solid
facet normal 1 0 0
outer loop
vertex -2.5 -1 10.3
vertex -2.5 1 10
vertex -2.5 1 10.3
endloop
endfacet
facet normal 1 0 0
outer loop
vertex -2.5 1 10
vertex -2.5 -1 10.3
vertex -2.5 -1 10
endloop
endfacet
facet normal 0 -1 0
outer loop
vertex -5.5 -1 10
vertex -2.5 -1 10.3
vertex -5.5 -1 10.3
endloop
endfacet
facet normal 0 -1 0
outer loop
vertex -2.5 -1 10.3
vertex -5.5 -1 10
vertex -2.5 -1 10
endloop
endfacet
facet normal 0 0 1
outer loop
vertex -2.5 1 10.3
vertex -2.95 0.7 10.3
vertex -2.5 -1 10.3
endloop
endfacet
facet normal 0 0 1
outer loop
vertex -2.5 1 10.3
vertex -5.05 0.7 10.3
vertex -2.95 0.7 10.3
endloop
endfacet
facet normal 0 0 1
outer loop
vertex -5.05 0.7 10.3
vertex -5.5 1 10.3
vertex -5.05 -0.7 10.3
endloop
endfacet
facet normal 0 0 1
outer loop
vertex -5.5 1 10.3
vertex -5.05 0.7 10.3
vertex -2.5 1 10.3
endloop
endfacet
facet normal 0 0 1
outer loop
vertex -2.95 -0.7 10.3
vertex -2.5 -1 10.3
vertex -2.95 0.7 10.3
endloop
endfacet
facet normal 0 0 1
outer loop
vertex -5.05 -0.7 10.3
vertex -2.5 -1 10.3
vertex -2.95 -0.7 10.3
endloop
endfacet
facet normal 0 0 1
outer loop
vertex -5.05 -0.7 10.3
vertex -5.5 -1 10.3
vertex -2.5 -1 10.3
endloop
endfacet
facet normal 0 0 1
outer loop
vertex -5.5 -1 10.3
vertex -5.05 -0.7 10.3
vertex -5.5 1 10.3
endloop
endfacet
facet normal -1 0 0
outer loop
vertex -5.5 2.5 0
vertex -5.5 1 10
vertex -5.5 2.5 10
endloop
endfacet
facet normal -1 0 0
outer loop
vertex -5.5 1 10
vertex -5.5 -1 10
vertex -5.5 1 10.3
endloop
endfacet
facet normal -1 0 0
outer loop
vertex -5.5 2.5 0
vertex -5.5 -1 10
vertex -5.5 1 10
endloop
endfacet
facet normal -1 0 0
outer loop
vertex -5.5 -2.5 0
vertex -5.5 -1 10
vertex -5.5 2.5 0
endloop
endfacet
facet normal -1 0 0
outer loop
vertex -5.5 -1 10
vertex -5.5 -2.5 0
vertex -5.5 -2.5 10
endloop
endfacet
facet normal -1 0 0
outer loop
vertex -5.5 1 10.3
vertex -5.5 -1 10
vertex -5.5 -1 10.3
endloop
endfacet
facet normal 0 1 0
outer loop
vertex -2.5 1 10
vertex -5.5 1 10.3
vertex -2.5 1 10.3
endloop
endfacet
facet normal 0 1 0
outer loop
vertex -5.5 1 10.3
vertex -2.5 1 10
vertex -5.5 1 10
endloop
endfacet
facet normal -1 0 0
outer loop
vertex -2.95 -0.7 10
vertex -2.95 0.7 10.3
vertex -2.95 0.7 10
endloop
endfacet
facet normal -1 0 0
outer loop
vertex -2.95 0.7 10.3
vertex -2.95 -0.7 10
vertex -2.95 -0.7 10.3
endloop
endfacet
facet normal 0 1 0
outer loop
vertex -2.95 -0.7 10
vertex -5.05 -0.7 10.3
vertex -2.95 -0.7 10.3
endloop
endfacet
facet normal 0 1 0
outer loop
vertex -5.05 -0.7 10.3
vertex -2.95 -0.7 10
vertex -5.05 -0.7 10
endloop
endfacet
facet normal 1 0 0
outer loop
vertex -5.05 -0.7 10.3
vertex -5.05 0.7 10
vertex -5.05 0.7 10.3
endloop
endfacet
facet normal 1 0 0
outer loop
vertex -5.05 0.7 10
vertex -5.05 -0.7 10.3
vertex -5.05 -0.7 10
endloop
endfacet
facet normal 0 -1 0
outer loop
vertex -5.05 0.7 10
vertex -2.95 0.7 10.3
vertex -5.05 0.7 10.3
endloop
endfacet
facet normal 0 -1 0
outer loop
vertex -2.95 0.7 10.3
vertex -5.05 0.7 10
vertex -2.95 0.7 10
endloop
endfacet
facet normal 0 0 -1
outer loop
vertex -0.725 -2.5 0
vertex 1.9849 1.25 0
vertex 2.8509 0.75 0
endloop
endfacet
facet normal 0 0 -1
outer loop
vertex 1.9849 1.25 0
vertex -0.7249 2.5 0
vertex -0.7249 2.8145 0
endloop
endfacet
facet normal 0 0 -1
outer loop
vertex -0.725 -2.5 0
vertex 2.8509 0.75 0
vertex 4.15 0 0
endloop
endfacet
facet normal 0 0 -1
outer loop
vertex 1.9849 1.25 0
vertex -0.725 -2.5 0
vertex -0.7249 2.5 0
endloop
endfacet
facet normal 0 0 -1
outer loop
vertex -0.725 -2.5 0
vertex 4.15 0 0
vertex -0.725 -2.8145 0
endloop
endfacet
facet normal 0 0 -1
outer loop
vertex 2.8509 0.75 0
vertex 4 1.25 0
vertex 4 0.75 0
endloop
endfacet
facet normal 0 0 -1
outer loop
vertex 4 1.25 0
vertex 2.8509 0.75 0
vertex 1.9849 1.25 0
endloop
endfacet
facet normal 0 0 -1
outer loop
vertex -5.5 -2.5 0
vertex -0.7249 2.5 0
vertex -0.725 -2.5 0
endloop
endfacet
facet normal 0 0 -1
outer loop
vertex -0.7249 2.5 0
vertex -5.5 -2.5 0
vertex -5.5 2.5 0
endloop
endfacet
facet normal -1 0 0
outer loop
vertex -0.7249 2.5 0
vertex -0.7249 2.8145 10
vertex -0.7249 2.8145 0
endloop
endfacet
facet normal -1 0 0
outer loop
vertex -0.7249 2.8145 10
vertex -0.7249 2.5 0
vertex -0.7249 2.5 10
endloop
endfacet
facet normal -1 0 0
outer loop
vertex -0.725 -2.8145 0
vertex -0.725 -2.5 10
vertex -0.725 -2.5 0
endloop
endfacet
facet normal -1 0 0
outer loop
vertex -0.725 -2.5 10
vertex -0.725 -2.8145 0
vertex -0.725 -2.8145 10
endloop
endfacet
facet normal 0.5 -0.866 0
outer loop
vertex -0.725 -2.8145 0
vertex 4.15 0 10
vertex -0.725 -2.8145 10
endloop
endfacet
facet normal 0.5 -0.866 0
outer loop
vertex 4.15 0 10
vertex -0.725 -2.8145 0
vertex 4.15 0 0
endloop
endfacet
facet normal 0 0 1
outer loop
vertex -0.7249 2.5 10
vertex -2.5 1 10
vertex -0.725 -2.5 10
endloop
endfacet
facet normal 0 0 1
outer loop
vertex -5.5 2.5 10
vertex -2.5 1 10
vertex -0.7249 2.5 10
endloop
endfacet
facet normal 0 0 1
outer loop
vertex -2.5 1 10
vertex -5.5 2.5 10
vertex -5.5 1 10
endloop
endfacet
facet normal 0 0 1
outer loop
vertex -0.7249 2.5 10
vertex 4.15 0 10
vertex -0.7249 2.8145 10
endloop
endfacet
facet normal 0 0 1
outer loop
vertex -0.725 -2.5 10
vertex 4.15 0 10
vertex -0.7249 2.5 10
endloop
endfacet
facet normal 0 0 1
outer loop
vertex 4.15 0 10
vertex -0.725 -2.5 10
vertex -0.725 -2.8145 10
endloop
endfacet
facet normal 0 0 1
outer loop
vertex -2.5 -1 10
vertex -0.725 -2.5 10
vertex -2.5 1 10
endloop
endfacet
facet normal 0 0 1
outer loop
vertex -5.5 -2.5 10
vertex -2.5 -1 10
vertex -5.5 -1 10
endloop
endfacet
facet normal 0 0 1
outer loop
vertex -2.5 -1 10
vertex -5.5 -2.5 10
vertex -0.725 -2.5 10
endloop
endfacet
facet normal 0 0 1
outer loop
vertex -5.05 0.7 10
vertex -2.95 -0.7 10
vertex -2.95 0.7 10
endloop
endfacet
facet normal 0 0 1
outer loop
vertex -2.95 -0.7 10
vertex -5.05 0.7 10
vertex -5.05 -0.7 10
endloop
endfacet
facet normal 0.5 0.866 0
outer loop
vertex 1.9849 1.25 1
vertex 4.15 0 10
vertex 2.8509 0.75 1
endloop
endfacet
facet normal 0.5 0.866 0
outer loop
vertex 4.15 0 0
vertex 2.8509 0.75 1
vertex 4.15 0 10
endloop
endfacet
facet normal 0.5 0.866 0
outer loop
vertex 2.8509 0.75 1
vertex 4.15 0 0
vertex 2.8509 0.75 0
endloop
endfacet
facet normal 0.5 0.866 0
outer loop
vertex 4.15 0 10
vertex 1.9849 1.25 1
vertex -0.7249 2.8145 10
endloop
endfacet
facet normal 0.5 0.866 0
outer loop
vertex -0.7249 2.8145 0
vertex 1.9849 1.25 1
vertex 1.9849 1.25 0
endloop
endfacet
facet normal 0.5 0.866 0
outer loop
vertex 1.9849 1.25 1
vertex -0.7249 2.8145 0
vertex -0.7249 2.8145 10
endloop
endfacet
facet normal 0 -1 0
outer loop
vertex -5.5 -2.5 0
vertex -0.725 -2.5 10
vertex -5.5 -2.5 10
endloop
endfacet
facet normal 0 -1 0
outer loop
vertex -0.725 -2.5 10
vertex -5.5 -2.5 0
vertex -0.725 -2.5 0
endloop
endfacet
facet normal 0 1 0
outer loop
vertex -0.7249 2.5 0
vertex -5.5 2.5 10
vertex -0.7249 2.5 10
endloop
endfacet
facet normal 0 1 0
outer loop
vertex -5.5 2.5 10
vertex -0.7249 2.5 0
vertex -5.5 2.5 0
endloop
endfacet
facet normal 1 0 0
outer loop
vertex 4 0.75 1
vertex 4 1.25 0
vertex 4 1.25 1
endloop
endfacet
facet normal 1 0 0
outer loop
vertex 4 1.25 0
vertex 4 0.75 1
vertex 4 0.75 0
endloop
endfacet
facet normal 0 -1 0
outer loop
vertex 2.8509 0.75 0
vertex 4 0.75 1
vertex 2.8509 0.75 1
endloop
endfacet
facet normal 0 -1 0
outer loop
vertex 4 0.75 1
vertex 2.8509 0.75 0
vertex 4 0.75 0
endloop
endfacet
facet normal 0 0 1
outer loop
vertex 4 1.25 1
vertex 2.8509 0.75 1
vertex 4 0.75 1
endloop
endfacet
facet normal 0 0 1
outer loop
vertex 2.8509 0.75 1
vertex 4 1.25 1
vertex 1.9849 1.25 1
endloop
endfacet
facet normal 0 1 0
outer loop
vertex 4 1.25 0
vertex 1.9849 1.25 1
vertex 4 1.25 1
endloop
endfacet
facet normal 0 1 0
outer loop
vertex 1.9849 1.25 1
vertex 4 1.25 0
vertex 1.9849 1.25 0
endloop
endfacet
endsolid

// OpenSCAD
union()
{
    translate([0.9, 0.0, 0.0])
    {
        linear_extrude(height = 10.0, twist = 0.0, scale = 1.0, slices = 1, center = false)
        {
            scale([6.5, 6.5])
            {
                M111();
            }
        }
    }
    translate([-3.0, 0.0, 0.0])
    {
        linear_extrude(height = 10.0, twist = 0.0, scale = 1.0, slices = 1, center = false)
        {
            scale([5.0, 5.0])
            {
                M52();
            }
        }
    }
    translate([0.0, 1.0, 0.0])
    {
        linear_extrude(height = 1.0, twist = 0.0, scale = 1.0, slices = 1, center = false)
        {
            scale([8.0, 0.5])
            {
                M52();
            }
        }
    }
    translate([-4.0, 0.0, 9.8])
    {
        difference()
        {
            linear_extrude(height = 0.5, twist = 0.0, scale = 1.0, slices = 1, center = false)
            {
                scale([3.0, 2.0])
                {
                    M52();
                }
            }
            linear_extrude(height = 0.5, twist = 0.0, scale = 1.0, slices = 1, center = false)
            {
                scale([2.0999999999999996, 1.4])
                {
                    M52();
                }
            }
        }
    }
}

module M52()
{
    polygon
    (
        points =
        [
            [-0.5, -0.5], 
            [0.5, -0.5], 
            [0.5, 0.5], 
            [-0.5, 0.5]
        ],
        paths =
        [
            [0, 1, 2, 3]
        ]
    );
}

module M111()
{
    polygon
    (
        points =
        [
            [0.5, 0.0], 
            [-0.2499999999999999, 0.43301270189221935], 
            [-0.2500000000000002, -0.4330127018922192]
        ],
        paths =
        [
            [0, 1, 2]
        ]
    );
}
